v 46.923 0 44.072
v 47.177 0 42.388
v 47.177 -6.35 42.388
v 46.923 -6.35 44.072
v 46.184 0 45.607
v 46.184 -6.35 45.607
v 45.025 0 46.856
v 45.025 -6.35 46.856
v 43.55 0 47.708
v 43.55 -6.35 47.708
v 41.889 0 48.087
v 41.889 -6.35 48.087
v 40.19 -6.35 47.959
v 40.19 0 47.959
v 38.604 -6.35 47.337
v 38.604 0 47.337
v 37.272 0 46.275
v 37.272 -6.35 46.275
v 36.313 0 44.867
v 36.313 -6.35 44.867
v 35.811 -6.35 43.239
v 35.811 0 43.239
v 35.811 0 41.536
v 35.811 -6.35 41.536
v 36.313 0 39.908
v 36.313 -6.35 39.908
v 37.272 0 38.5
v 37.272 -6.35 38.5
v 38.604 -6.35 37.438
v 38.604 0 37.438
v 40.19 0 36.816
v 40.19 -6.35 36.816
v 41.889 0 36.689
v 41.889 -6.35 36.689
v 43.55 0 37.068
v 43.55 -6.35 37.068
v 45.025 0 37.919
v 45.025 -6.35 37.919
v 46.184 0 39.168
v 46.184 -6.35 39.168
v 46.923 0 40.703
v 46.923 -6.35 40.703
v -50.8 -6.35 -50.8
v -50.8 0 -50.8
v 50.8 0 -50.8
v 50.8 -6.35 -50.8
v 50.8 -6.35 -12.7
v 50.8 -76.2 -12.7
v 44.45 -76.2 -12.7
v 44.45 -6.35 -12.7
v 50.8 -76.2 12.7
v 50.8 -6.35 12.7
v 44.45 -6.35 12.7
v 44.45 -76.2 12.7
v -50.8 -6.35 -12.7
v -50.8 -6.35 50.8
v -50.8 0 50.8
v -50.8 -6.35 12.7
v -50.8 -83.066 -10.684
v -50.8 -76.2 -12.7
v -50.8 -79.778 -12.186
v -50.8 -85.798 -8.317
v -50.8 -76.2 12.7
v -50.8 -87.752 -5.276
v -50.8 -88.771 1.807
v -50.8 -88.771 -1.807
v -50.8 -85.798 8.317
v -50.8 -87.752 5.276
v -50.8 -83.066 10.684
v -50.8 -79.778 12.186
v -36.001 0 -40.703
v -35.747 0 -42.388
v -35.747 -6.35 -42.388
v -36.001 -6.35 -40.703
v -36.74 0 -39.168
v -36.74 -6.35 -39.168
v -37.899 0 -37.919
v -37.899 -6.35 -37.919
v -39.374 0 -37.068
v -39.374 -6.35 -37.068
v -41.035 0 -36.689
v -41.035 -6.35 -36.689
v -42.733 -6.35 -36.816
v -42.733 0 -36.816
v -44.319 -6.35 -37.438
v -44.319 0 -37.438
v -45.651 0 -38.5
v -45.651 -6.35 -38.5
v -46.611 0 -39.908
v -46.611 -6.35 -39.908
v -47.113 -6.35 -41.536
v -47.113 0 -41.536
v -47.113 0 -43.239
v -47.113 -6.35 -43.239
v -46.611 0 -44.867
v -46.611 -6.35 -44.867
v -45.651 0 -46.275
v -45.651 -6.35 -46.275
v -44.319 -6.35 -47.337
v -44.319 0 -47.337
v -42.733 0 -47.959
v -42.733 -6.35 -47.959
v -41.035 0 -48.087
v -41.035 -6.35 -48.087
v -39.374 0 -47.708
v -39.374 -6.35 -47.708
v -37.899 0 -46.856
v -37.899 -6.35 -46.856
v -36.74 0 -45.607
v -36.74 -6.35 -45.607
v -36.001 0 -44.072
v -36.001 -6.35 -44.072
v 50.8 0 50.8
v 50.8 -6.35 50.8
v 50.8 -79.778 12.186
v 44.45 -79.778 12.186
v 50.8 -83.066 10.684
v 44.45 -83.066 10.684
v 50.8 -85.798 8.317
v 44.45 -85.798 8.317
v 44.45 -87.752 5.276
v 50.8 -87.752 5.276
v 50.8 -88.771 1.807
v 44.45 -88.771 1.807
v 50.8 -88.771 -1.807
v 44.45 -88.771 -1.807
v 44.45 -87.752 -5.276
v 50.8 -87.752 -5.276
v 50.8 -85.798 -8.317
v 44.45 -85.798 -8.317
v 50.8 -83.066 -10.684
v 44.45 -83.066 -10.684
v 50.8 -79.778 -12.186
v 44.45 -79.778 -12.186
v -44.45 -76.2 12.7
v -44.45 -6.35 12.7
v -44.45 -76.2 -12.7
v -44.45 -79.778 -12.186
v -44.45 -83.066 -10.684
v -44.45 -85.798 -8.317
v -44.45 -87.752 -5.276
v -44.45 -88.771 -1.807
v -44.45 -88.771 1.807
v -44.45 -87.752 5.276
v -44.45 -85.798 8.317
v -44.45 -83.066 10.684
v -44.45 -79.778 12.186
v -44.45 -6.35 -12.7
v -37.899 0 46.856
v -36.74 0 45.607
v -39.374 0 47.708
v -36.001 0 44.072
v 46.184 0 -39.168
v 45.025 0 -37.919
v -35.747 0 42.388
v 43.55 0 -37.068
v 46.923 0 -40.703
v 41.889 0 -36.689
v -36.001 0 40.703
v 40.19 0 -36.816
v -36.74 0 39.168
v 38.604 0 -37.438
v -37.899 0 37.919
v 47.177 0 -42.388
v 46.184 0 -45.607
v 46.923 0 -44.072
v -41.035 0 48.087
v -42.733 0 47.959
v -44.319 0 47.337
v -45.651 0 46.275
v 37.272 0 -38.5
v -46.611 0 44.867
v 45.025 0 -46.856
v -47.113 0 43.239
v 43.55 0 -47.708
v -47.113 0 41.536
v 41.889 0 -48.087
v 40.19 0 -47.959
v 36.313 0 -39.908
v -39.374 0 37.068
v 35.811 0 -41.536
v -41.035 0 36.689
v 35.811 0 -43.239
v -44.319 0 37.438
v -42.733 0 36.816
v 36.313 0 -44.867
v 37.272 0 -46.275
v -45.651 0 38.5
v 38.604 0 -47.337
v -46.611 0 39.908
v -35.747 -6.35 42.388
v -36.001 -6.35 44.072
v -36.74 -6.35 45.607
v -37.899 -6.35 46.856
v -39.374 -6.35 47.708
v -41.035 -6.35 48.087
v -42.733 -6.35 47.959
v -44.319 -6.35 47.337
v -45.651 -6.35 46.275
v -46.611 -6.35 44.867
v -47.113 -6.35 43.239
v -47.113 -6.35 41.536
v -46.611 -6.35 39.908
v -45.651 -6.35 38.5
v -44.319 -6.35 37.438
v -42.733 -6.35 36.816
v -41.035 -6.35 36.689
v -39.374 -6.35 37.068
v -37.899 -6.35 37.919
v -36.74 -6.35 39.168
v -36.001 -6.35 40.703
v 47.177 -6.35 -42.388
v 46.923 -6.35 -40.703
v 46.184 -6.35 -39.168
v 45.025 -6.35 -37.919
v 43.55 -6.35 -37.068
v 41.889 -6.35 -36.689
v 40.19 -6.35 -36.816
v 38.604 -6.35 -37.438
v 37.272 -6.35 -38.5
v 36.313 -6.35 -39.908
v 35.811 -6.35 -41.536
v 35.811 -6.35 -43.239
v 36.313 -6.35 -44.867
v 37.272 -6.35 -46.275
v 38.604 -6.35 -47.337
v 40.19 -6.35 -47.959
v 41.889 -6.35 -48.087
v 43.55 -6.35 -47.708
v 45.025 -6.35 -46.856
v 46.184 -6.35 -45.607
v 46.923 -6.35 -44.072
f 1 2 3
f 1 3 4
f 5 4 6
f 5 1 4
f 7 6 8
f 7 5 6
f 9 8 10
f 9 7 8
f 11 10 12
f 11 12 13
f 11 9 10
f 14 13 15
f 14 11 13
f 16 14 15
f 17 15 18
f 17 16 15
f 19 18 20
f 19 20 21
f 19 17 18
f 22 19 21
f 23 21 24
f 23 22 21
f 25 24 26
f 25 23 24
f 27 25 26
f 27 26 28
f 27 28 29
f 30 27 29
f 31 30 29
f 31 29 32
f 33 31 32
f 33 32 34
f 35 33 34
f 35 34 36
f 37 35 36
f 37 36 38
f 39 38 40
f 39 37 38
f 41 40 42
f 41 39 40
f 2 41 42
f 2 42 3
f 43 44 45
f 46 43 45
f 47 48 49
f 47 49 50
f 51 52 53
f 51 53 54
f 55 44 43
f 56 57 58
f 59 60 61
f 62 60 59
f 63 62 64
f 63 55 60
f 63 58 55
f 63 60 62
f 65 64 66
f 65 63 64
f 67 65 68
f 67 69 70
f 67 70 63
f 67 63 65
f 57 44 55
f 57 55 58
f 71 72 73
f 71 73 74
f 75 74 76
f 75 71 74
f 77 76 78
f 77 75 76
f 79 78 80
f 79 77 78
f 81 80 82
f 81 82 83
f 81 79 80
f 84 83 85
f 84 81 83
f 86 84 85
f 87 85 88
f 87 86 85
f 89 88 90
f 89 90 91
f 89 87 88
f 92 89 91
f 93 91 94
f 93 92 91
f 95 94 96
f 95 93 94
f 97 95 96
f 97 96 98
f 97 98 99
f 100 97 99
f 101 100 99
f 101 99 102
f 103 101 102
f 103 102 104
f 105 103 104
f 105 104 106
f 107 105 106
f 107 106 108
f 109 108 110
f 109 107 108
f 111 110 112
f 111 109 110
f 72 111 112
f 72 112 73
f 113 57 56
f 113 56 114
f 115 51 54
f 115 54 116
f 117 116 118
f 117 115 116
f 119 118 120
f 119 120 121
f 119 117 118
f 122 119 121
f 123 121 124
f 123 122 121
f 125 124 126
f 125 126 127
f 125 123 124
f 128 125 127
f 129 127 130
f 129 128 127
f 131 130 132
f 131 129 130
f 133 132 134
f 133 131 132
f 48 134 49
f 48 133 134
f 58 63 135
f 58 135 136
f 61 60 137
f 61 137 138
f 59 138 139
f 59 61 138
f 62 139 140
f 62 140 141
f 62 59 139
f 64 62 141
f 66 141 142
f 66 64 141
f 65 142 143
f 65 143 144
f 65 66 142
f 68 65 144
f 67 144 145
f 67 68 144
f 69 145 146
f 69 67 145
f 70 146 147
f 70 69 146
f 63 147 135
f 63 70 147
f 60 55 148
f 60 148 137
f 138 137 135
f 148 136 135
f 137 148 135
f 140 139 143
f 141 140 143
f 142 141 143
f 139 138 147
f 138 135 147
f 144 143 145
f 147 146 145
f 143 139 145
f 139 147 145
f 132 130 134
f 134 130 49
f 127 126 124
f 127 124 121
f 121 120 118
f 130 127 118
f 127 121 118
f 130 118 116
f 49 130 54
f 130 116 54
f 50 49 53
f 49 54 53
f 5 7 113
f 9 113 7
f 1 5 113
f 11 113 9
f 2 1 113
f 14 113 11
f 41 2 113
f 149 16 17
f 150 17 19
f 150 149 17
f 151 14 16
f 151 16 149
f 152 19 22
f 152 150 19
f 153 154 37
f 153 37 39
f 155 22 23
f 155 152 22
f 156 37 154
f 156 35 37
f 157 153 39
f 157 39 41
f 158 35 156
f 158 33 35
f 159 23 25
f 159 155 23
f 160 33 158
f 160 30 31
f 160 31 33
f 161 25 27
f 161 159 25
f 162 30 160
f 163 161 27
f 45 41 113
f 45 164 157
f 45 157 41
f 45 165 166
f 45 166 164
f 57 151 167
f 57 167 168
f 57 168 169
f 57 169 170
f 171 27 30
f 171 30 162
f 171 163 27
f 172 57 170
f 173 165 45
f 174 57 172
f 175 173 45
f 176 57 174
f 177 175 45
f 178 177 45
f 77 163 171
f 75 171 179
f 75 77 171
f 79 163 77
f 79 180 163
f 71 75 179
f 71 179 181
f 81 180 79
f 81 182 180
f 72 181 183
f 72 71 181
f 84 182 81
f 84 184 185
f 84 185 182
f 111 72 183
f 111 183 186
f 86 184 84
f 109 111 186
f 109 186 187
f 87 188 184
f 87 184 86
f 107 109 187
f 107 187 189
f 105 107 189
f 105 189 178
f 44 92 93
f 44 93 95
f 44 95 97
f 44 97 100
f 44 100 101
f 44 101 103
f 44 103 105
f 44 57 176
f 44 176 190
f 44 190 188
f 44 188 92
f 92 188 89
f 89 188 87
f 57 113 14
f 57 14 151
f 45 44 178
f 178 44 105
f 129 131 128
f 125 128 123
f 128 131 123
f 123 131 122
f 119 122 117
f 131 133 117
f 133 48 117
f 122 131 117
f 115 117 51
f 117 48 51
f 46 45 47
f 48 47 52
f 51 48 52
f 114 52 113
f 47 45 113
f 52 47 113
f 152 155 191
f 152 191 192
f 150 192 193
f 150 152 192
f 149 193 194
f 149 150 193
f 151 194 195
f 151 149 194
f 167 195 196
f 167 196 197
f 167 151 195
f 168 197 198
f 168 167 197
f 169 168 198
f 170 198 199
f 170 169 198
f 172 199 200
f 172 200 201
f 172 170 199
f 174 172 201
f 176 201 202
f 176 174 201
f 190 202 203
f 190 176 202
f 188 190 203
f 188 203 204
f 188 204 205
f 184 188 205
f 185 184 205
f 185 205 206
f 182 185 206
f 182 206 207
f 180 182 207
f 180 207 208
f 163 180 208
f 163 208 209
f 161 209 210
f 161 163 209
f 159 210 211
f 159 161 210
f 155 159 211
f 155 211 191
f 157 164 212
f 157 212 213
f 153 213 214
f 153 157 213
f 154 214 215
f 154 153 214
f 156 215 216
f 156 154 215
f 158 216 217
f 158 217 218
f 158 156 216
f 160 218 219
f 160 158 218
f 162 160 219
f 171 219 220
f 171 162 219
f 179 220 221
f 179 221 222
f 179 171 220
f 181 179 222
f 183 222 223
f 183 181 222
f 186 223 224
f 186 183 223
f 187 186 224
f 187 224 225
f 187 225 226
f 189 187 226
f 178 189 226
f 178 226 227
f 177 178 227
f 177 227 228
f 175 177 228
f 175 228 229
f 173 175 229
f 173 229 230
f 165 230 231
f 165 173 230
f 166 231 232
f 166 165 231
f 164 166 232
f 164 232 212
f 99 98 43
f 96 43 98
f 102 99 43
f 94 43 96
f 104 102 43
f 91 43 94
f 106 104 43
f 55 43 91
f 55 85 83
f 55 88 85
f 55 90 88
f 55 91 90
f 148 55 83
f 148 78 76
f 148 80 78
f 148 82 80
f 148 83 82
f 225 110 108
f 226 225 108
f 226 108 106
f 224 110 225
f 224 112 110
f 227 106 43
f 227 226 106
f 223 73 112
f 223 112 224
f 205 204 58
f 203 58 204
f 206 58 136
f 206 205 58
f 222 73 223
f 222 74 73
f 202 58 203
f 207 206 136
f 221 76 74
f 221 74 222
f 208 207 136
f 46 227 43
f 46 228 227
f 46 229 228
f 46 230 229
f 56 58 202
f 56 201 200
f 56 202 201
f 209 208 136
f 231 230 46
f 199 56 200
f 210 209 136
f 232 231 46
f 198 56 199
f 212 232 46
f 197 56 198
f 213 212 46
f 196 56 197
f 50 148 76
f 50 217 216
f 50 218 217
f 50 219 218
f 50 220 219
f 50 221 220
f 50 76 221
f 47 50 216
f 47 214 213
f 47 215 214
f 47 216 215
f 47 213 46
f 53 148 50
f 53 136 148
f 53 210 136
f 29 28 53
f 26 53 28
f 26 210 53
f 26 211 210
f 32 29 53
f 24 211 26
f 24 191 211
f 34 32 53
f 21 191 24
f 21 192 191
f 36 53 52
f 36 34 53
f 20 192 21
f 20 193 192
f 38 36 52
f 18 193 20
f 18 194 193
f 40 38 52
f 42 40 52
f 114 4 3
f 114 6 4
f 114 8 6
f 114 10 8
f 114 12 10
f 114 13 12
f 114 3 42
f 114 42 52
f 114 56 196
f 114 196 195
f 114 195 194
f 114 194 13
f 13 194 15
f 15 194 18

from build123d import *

# Parameters (mm, degrees)
F0_W     = 101.6
F0_H     = 101.6
F1_DEPTH = 6.35
F2_R     = 5.715
F3_DEPTH = 6.35
F8_DEPTH = 6.35
F9_DEPTH = 6.35


with BuildPart() as f1:
    # F0 (on Front) → F1 (new body)
    with BuildSketch(Plane.XZ):
        Rectangle(F0_W, F0_H)
    extrude(amount=F1_DEPTH)

    # F2 (on Front) → F3 (cut)
    with BuildSketch(Plane.XZ):
        with Locations((-41.4617918432, 42.3875935376)):
            Circle(F2_R)
        with Locations((41.4617918432, 42.3875935376)):
            Circle(F2_R)
        with Locations((-41.4617918432, -42.3875935376)):
            Circle(F2_R)
        with Locations((41.4617918432, -42.3875935376)):
            Circle(F2_R)
    extrude(amount=F3_DEPTH, mode=Mode.SUBTRACT)

    # F7 (on offset) → F8 (join)
    with BuildSketch(Plane.YZ.offset(50.8)):
        with BuildLine():
            Line((0, -12.7), (0, 12.7))
            Line((0, 12.7), (-76.2, 12.7))
            ThreePointArc((-76.2, 12.7), (-88.9, 0), (-76.2, -12.7))
            Line((-76.2, -12.7), (0, -12.7))
        make_face()
    extrude(amount=-F8_DEPTH)

    # F5 (on offset) → F9 (join)
    with BuildSketch(Plane(origin=(-50.8, 0, 0), x_dir=(0, -1, 0), z_dir=(-1, 0, 0))):
        with BuildLine():
            Line((76.2, 12.7), (0, 12.7))
            Line((0, 12.7), (0, -12.7))
            Line((0, -12.7), (76.2, -12.7))
            ThreePointArc((76.2, -12.7), (88.9, 0), (76.2, 12.7))
        make_face()
    extrude(amount=-F9_DEPTH)


solid = f1.part
